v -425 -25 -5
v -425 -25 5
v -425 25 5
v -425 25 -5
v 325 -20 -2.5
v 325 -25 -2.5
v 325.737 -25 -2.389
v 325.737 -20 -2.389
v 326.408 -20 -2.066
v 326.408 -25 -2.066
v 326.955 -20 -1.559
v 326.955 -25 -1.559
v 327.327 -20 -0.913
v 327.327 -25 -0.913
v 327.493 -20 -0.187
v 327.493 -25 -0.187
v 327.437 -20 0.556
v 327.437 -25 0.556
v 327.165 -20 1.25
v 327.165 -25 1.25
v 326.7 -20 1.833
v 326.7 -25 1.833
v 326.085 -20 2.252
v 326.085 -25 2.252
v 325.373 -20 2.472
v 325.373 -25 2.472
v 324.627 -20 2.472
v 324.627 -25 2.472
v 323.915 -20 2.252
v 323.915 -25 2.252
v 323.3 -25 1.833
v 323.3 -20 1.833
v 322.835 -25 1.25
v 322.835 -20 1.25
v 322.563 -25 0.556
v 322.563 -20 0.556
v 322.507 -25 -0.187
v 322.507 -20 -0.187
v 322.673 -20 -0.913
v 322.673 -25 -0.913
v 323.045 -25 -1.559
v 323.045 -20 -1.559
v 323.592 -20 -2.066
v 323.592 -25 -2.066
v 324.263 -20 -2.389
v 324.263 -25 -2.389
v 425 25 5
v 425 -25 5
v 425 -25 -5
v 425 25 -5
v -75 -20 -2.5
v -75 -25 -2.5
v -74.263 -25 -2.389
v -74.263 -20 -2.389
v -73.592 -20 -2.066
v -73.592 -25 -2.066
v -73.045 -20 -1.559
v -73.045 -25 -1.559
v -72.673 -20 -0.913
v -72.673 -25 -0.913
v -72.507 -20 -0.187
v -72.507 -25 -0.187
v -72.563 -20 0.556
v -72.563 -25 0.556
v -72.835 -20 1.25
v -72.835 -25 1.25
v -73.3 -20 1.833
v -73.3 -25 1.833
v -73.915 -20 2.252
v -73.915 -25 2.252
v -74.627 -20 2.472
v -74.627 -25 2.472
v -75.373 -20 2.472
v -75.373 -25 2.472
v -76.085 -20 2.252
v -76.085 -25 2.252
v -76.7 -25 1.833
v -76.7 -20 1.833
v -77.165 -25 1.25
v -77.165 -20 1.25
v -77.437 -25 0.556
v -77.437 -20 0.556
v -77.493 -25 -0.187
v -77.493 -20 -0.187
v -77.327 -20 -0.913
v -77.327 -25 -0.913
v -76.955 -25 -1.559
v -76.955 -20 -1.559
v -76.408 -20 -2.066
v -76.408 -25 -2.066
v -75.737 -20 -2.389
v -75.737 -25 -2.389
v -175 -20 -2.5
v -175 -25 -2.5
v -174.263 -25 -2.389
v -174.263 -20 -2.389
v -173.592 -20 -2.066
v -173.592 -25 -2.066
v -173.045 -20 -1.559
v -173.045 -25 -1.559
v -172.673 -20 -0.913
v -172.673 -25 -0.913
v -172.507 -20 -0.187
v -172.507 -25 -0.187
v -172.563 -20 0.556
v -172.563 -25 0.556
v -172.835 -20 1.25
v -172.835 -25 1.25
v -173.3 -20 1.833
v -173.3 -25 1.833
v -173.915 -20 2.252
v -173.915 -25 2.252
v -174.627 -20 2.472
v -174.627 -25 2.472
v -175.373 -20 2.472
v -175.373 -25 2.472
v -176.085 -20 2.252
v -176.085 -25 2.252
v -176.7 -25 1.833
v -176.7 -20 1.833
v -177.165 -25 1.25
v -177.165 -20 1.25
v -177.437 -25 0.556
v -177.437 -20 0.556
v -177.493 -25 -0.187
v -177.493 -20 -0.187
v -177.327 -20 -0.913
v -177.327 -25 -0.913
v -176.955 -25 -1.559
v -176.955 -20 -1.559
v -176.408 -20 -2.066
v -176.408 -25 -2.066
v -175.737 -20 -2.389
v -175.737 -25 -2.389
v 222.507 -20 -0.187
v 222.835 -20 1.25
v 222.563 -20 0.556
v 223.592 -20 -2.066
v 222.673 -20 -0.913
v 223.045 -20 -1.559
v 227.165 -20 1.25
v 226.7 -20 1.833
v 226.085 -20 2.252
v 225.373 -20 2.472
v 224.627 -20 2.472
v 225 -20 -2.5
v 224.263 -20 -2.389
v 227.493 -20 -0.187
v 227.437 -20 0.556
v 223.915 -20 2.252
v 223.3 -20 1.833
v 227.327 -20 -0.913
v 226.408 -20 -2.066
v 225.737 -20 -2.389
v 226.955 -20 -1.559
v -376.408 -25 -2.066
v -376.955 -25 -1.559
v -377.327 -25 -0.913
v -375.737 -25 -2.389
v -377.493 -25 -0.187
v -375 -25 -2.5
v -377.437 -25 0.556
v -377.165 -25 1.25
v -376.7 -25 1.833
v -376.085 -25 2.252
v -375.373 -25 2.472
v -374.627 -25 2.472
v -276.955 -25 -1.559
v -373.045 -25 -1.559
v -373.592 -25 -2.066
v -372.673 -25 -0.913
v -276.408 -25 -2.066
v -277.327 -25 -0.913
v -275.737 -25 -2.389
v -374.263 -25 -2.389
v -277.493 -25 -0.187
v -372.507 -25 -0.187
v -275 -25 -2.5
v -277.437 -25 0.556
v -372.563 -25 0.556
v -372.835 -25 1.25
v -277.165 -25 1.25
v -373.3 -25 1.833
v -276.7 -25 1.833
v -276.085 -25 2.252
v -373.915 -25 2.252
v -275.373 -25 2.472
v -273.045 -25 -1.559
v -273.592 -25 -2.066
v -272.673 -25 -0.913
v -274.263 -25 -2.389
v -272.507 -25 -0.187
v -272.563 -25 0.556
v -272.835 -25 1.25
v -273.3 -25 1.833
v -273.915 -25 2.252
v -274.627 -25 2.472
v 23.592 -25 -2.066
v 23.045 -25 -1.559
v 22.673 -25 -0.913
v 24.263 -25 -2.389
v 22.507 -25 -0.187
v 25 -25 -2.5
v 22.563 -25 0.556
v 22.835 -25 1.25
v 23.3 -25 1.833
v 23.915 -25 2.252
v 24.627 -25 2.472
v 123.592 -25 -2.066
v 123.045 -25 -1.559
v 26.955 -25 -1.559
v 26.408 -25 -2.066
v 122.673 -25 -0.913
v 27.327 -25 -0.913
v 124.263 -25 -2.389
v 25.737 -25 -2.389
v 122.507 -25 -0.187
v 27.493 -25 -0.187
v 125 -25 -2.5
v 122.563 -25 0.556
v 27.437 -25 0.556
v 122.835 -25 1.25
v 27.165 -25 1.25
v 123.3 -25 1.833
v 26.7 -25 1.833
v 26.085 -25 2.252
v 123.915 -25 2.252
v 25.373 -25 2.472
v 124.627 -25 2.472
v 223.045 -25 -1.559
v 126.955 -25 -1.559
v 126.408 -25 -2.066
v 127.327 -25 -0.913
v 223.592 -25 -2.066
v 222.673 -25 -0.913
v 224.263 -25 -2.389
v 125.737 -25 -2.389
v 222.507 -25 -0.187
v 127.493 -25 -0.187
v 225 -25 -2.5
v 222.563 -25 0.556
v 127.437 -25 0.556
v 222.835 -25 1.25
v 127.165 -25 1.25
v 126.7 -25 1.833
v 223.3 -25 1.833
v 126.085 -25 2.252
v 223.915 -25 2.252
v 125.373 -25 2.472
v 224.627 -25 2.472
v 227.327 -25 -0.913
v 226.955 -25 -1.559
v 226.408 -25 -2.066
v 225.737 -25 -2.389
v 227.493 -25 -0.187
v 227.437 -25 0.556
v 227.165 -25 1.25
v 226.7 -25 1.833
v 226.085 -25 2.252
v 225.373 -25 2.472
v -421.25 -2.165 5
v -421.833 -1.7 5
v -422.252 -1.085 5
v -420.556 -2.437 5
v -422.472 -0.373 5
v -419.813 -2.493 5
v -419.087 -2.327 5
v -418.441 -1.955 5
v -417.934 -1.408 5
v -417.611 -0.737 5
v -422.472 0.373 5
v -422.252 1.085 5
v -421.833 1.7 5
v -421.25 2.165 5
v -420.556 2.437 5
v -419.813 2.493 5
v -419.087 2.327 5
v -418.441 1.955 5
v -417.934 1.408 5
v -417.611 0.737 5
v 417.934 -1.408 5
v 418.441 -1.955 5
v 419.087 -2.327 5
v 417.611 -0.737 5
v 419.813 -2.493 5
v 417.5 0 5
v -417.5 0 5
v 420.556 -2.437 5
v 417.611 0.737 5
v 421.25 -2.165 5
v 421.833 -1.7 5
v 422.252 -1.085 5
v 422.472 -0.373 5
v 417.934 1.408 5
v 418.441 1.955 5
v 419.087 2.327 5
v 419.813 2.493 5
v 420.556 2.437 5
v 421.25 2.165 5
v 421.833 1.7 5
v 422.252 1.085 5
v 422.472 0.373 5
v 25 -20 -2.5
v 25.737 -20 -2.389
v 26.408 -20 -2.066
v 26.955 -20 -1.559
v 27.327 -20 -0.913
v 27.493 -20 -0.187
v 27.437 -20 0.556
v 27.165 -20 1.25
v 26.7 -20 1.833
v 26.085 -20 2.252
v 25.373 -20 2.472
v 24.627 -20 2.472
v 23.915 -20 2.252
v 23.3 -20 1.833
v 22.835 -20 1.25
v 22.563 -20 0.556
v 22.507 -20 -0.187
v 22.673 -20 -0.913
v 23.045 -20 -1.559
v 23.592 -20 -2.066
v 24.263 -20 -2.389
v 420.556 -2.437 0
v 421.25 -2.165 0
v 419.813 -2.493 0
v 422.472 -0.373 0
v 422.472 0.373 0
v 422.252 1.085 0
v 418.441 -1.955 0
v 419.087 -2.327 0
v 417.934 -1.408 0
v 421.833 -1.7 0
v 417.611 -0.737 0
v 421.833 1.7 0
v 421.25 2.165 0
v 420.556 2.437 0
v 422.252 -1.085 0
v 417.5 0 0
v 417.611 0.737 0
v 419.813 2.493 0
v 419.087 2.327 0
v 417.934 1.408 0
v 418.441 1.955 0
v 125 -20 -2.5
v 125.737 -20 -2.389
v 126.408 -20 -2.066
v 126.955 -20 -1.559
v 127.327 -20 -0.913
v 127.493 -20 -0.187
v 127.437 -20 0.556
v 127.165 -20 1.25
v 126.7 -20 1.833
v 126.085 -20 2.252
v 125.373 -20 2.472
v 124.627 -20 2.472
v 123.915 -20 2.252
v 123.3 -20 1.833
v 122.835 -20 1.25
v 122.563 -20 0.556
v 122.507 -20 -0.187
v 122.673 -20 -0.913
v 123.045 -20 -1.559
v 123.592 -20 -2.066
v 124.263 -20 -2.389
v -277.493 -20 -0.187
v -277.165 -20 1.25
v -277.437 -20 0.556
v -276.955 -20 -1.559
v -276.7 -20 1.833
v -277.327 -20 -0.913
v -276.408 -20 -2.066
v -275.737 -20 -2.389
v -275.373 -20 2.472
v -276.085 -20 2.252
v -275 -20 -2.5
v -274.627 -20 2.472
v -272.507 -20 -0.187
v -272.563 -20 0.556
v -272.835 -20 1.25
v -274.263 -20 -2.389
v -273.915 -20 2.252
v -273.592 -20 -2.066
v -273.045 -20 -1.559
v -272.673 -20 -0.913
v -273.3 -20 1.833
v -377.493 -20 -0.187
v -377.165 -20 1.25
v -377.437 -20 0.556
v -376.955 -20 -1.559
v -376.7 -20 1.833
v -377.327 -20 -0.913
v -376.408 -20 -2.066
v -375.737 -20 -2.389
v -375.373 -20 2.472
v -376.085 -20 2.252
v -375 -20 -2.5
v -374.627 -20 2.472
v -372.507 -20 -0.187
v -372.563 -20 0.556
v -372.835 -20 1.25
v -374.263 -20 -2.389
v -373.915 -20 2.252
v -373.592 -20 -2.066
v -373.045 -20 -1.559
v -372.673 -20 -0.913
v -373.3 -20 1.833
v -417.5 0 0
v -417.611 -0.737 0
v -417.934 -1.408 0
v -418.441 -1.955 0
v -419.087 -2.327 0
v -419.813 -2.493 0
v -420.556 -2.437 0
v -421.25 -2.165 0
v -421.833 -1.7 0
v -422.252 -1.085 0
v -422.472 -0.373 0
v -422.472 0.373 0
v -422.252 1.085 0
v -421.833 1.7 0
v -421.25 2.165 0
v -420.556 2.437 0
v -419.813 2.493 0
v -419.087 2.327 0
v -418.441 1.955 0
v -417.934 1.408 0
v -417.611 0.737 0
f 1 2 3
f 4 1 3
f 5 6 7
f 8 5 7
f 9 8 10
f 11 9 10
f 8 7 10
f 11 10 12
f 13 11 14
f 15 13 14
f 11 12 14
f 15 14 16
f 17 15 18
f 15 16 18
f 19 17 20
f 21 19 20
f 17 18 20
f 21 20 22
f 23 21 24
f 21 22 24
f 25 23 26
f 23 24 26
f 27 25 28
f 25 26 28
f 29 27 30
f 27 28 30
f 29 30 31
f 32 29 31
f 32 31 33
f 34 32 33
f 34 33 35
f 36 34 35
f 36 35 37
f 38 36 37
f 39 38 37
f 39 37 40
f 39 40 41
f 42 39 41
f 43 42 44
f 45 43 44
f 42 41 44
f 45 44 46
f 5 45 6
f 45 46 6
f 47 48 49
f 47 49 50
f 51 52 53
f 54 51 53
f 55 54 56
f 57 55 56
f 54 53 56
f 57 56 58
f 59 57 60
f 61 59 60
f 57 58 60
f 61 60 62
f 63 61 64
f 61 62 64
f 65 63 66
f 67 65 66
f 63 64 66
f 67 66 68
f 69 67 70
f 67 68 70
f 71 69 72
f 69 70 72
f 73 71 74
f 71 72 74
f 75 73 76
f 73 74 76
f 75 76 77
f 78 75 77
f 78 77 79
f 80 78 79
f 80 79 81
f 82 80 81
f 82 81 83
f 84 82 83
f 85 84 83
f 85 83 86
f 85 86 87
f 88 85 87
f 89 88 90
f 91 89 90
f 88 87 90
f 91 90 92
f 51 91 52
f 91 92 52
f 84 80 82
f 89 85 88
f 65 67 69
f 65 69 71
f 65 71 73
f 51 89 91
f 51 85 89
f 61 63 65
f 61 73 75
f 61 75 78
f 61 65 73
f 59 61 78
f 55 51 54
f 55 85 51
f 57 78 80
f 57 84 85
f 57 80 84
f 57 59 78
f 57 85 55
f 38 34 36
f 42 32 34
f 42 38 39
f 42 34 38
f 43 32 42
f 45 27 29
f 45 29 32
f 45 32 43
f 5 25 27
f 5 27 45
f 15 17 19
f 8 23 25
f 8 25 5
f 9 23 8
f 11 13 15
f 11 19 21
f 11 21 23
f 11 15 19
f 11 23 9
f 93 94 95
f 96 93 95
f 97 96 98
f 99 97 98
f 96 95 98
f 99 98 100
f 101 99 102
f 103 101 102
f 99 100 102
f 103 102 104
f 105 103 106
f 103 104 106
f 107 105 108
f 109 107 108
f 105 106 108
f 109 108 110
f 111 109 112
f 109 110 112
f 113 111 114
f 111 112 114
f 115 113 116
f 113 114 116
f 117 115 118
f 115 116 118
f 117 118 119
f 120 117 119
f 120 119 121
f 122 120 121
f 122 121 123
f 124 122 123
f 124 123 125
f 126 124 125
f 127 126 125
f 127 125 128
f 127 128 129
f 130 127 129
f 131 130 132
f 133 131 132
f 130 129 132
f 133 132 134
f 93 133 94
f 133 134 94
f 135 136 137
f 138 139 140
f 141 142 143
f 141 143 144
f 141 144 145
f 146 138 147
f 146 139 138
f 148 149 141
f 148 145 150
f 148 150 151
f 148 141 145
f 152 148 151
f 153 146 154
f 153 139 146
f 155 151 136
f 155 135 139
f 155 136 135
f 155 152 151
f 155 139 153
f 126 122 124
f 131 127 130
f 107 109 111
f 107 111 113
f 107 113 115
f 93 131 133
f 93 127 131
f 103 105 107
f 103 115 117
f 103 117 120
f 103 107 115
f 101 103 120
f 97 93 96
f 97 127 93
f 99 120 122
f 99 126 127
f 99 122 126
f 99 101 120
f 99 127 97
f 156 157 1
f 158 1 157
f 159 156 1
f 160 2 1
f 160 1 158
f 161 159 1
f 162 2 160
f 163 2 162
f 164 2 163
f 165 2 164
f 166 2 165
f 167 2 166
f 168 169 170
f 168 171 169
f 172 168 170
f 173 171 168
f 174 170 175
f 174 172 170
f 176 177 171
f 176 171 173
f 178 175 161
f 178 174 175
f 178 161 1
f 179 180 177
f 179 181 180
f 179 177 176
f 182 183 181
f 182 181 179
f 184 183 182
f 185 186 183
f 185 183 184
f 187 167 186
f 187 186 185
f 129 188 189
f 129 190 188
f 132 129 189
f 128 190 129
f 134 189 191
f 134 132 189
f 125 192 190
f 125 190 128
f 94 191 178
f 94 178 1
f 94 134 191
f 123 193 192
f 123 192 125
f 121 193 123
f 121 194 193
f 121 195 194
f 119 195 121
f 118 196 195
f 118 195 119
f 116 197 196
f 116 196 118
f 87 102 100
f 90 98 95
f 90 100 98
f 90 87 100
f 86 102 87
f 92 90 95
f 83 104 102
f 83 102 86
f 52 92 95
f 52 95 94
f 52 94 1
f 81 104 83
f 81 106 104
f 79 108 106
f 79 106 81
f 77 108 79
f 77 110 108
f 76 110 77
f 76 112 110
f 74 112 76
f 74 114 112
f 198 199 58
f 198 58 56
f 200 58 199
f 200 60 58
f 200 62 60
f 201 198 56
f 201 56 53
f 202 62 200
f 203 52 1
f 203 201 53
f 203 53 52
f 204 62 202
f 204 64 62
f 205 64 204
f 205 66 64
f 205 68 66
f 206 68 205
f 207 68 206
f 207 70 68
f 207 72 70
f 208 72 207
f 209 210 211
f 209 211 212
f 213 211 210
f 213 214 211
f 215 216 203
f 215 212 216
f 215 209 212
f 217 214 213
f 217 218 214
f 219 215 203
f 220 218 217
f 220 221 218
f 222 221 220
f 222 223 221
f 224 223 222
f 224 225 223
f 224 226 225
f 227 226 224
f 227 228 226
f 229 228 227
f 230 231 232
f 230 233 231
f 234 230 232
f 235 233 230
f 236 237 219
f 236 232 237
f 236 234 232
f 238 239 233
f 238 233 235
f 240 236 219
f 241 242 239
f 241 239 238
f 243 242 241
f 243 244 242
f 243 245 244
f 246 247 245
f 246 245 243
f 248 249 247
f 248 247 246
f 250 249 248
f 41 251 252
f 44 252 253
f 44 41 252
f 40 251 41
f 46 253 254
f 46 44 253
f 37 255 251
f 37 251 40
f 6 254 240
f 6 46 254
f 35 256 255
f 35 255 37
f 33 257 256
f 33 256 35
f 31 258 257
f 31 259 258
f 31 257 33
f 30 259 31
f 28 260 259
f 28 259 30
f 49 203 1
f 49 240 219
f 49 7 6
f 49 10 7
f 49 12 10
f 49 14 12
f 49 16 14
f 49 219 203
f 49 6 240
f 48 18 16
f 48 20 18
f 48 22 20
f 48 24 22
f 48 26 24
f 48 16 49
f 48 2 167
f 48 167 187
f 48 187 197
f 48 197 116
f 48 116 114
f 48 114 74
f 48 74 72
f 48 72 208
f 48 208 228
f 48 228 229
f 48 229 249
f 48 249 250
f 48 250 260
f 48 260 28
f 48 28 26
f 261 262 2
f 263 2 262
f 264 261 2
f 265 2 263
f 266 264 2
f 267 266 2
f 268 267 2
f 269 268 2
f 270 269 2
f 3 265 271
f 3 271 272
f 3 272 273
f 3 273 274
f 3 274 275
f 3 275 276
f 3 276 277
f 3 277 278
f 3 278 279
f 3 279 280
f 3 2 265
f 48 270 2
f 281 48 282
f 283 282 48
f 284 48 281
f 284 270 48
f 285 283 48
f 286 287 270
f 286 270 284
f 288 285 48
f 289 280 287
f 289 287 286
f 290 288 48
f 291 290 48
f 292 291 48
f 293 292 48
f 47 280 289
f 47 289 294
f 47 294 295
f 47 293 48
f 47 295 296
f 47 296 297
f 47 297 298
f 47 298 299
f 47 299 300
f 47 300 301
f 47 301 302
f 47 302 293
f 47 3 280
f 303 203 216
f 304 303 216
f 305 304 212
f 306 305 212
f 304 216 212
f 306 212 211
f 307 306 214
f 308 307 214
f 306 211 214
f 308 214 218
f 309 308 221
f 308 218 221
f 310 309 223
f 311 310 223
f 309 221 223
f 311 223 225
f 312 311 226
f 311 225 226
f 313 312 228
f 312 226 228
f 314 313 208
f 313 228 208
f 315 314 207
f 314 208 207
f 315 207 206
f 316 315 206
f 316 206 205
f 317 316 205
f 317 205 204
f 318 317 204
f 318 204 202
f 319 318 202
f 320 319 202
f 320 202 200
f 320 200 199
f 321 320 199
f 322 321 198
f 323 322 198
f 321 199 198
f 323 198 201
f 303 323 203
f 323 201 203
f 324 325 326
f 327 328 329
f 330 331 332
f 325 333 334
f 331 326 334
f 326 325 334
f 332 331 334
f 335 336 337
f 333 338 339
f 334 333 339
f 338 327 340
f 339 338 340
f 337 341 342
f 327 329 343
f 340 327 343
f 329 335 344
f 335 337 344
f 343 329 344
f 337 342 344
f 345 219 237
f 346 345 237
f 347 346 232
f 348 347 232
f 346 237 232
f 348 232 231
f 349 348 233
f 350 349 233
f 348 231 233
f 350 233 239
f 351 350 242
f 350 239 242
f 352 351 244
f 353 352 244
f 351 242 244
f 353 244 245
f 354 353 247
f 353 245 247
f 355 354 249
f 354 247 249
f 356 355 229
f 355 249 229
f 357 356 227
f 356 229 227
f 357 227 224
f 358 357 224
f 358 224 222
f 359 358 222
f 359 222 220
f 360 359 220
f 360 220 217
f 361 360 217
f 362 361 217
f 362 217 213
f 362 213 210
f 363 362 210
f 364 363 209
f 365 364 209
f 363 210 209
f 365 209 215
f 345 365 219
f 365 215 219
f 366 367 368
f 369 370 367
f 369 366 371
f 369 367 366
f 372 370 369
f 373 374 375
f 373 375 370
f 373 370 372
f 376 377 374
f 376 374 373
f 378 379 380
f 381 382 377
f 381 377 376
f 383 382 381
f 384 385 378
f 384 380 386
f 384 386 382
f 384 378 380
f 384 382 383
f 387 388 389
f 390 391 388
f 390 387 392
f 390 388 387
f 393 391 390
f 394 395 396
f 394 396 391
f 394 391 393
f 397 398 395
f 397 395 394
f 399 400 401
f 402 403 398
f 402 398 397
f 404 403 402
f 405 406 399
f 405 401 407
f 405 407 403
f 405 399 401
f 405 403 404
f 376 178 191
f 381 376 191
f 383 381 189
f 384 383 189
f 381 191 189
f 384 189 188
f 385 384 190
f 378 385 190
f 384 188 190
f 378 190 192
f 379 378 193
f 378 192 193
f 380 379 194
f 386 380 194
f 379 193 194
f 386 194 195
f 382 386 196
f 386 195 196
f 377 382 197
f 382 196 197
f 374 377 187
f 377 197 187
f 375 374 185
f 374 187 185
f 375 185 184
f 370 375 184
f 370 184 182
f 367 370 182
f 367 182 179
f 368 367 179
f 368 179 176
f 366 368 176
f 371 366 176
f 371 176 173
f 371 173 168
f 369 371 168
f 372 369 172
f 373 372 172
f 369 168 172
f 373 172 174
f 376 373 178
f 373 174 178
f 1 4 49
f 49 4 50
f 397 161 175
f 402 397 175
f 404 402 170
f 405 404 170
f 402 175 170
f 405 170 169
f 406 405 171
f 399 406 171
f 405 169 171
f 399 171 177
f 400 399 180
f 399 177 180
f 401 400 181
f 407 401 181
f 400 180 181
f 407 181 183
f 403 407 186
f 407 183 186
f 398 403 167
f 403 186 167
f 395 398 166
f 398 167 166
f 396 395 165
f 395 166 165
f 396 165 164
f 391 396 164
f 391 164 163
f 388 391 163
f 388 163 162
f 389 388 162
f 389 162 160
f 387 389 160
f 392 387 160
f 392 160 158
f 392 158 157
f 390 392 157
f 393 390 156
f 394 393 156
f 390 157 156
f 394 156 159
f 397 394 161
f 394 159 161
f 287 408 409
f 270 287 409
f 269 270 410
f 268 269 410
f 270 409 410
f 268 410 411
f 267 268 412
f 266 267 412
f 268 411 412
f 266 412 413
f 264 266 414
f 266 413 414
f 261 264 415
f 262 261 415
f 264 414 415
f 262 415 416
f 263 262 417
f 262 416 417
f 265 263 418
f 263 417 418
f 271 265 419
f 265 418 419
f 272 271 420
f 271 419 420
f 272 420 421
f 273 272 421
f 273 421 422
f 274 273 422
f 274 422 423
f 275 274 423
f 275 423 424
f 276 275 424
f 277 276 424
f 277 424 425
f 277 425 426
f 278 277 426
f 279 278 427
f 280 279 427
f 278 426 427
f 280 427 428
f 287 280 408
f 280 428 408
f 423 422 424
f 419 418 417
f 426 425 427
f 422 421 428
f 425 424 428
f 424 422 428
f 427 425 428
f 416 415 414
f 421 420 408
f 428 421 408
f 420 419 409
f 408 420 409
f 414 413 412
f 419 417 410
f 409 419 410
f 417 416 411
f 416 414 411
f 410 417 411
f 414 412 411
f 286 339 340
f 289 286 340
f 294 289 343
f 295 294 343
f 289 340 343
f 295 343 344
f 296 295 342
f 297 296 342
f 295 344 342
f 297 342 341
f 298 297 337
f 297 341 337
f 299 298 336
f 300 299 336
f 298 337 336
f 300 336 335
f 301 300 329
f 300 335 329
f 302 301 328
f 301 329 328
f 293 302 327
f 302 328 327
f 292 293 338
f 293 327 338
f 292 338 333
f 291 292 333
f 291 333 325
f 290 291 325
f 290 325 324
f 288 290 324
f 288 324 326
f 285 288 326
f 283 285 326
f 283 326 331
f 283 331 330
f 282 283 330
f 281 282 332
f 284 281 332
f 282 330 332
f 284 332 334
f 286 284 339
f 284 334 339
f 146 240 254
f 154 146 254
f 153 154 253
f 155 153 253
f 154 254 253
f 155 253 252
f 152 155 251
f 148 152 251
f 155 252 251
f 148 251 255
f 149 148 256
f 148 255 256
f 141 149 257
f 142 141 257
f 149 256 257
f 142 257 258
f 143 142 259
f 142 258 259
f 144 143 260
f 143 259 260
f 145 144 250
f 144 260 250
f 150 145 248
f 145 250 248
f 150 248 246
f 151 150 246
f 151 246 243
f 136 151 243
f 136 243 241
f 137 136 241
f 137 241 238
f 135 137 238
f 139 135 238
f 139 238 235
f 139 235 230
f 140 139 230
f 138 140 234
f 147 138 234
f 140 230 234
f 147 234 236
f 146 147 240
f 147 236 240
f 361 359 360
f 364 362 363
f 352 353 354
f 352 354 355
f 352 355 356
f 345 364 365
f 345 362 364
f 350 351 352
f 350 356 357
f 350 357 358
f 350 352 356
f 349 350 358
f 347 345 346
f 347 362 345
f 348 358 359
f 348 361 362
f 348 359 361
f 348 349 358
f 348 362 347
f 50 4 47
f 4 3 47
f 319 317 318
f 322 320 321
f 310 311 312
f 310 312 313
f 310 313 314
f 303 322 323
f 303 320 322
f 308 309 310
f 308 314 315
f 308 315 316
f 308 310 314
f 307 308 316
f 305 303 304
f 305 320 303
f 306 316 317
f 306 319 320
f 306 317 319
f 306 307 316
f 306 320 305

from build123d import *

# Parameters (mm, degrees)
CROQUIS1_W              = 850
CROQUIS1_H              = 50
SALIENTE_EXTRUIR1_DEPTH = 5
CROQUIS2_R              = 2.5
CORTAR_EXTRUIR1_DEPTH   = 5
CORTAR_EXTRUIR3_START   = -5
CROQUIS4_R              = 2.5
CORTAR_EXTRUIR3_DEPTH   = 5


with BuildPart() as part:
    # Croquis1 → Saliente-Extruir1 (new, symmetric)
    with BuildSketch(Plane.XY):
        Rectangle(CROQUIS1_W, CROQUIS1_H)
    extrude(amount=SALIENTE_EXTRUIR1_DEPTH, both=True)

    # Croquis2 → Cortar-Extruir1 (cut)
    with BuildSketch(Plane.XZ.offset(25)):
        with Locations(Location((-375, 0, 0), (0, 0, 270))):
            Circle(CROQUIS2_R)
        with Locations(Location((-275, 0, 0), (0, 0, 270))):
            Circle(CROQUIS2_R)
        with Locations(Location((-175, 0, 0), (0, 0, 270))):
            Circle(CROQUIS2_R)
        with Locations(Location((-75, 0, 0), (0, 0, 270))):
            Circle(CROQUIS2_R)
        with Locations(Location((25, 0, 0), (0, 0, 270))):
            Circle(CROQUIS2_R)
        with Locations(Location((125, 0, 0), (0, 0, 270))):
            Circle(CROQUIS2_R)
        with Locations(Location((225, 0, 0), (0, 0, 270))):
            Circle(CROQUIS2_R)
        with Locations(Location((325, 0, 0), (0, 0, 270))):
            Circle(CROQUIS2_R)
    extrude(amount=-CORTAR_EXTRUIR1_DEPTH, mode=Mode.SUBTRACT)

    # Croquis4 → Cortar-Extruir3 (cut)
    with BuildSketch(Plane(origin=(0, 0, -5), x_dir=(-1, 0, 0), z_dir=(0, 0, -1)).offset(CORTAR_EXTRUIR3_START)):
        with Locations((-420, 0)):
            Circle(CROQUIS4_R)
        with Locations(Location((420, 0, 0), (0, 0, 180))):
            Circle(CROQUIS4_R)
    extrude(amount=-CORTAR_EXTRUIR3_DEPTH, mode=Mode.SUBTRACT)


solid = part.part
